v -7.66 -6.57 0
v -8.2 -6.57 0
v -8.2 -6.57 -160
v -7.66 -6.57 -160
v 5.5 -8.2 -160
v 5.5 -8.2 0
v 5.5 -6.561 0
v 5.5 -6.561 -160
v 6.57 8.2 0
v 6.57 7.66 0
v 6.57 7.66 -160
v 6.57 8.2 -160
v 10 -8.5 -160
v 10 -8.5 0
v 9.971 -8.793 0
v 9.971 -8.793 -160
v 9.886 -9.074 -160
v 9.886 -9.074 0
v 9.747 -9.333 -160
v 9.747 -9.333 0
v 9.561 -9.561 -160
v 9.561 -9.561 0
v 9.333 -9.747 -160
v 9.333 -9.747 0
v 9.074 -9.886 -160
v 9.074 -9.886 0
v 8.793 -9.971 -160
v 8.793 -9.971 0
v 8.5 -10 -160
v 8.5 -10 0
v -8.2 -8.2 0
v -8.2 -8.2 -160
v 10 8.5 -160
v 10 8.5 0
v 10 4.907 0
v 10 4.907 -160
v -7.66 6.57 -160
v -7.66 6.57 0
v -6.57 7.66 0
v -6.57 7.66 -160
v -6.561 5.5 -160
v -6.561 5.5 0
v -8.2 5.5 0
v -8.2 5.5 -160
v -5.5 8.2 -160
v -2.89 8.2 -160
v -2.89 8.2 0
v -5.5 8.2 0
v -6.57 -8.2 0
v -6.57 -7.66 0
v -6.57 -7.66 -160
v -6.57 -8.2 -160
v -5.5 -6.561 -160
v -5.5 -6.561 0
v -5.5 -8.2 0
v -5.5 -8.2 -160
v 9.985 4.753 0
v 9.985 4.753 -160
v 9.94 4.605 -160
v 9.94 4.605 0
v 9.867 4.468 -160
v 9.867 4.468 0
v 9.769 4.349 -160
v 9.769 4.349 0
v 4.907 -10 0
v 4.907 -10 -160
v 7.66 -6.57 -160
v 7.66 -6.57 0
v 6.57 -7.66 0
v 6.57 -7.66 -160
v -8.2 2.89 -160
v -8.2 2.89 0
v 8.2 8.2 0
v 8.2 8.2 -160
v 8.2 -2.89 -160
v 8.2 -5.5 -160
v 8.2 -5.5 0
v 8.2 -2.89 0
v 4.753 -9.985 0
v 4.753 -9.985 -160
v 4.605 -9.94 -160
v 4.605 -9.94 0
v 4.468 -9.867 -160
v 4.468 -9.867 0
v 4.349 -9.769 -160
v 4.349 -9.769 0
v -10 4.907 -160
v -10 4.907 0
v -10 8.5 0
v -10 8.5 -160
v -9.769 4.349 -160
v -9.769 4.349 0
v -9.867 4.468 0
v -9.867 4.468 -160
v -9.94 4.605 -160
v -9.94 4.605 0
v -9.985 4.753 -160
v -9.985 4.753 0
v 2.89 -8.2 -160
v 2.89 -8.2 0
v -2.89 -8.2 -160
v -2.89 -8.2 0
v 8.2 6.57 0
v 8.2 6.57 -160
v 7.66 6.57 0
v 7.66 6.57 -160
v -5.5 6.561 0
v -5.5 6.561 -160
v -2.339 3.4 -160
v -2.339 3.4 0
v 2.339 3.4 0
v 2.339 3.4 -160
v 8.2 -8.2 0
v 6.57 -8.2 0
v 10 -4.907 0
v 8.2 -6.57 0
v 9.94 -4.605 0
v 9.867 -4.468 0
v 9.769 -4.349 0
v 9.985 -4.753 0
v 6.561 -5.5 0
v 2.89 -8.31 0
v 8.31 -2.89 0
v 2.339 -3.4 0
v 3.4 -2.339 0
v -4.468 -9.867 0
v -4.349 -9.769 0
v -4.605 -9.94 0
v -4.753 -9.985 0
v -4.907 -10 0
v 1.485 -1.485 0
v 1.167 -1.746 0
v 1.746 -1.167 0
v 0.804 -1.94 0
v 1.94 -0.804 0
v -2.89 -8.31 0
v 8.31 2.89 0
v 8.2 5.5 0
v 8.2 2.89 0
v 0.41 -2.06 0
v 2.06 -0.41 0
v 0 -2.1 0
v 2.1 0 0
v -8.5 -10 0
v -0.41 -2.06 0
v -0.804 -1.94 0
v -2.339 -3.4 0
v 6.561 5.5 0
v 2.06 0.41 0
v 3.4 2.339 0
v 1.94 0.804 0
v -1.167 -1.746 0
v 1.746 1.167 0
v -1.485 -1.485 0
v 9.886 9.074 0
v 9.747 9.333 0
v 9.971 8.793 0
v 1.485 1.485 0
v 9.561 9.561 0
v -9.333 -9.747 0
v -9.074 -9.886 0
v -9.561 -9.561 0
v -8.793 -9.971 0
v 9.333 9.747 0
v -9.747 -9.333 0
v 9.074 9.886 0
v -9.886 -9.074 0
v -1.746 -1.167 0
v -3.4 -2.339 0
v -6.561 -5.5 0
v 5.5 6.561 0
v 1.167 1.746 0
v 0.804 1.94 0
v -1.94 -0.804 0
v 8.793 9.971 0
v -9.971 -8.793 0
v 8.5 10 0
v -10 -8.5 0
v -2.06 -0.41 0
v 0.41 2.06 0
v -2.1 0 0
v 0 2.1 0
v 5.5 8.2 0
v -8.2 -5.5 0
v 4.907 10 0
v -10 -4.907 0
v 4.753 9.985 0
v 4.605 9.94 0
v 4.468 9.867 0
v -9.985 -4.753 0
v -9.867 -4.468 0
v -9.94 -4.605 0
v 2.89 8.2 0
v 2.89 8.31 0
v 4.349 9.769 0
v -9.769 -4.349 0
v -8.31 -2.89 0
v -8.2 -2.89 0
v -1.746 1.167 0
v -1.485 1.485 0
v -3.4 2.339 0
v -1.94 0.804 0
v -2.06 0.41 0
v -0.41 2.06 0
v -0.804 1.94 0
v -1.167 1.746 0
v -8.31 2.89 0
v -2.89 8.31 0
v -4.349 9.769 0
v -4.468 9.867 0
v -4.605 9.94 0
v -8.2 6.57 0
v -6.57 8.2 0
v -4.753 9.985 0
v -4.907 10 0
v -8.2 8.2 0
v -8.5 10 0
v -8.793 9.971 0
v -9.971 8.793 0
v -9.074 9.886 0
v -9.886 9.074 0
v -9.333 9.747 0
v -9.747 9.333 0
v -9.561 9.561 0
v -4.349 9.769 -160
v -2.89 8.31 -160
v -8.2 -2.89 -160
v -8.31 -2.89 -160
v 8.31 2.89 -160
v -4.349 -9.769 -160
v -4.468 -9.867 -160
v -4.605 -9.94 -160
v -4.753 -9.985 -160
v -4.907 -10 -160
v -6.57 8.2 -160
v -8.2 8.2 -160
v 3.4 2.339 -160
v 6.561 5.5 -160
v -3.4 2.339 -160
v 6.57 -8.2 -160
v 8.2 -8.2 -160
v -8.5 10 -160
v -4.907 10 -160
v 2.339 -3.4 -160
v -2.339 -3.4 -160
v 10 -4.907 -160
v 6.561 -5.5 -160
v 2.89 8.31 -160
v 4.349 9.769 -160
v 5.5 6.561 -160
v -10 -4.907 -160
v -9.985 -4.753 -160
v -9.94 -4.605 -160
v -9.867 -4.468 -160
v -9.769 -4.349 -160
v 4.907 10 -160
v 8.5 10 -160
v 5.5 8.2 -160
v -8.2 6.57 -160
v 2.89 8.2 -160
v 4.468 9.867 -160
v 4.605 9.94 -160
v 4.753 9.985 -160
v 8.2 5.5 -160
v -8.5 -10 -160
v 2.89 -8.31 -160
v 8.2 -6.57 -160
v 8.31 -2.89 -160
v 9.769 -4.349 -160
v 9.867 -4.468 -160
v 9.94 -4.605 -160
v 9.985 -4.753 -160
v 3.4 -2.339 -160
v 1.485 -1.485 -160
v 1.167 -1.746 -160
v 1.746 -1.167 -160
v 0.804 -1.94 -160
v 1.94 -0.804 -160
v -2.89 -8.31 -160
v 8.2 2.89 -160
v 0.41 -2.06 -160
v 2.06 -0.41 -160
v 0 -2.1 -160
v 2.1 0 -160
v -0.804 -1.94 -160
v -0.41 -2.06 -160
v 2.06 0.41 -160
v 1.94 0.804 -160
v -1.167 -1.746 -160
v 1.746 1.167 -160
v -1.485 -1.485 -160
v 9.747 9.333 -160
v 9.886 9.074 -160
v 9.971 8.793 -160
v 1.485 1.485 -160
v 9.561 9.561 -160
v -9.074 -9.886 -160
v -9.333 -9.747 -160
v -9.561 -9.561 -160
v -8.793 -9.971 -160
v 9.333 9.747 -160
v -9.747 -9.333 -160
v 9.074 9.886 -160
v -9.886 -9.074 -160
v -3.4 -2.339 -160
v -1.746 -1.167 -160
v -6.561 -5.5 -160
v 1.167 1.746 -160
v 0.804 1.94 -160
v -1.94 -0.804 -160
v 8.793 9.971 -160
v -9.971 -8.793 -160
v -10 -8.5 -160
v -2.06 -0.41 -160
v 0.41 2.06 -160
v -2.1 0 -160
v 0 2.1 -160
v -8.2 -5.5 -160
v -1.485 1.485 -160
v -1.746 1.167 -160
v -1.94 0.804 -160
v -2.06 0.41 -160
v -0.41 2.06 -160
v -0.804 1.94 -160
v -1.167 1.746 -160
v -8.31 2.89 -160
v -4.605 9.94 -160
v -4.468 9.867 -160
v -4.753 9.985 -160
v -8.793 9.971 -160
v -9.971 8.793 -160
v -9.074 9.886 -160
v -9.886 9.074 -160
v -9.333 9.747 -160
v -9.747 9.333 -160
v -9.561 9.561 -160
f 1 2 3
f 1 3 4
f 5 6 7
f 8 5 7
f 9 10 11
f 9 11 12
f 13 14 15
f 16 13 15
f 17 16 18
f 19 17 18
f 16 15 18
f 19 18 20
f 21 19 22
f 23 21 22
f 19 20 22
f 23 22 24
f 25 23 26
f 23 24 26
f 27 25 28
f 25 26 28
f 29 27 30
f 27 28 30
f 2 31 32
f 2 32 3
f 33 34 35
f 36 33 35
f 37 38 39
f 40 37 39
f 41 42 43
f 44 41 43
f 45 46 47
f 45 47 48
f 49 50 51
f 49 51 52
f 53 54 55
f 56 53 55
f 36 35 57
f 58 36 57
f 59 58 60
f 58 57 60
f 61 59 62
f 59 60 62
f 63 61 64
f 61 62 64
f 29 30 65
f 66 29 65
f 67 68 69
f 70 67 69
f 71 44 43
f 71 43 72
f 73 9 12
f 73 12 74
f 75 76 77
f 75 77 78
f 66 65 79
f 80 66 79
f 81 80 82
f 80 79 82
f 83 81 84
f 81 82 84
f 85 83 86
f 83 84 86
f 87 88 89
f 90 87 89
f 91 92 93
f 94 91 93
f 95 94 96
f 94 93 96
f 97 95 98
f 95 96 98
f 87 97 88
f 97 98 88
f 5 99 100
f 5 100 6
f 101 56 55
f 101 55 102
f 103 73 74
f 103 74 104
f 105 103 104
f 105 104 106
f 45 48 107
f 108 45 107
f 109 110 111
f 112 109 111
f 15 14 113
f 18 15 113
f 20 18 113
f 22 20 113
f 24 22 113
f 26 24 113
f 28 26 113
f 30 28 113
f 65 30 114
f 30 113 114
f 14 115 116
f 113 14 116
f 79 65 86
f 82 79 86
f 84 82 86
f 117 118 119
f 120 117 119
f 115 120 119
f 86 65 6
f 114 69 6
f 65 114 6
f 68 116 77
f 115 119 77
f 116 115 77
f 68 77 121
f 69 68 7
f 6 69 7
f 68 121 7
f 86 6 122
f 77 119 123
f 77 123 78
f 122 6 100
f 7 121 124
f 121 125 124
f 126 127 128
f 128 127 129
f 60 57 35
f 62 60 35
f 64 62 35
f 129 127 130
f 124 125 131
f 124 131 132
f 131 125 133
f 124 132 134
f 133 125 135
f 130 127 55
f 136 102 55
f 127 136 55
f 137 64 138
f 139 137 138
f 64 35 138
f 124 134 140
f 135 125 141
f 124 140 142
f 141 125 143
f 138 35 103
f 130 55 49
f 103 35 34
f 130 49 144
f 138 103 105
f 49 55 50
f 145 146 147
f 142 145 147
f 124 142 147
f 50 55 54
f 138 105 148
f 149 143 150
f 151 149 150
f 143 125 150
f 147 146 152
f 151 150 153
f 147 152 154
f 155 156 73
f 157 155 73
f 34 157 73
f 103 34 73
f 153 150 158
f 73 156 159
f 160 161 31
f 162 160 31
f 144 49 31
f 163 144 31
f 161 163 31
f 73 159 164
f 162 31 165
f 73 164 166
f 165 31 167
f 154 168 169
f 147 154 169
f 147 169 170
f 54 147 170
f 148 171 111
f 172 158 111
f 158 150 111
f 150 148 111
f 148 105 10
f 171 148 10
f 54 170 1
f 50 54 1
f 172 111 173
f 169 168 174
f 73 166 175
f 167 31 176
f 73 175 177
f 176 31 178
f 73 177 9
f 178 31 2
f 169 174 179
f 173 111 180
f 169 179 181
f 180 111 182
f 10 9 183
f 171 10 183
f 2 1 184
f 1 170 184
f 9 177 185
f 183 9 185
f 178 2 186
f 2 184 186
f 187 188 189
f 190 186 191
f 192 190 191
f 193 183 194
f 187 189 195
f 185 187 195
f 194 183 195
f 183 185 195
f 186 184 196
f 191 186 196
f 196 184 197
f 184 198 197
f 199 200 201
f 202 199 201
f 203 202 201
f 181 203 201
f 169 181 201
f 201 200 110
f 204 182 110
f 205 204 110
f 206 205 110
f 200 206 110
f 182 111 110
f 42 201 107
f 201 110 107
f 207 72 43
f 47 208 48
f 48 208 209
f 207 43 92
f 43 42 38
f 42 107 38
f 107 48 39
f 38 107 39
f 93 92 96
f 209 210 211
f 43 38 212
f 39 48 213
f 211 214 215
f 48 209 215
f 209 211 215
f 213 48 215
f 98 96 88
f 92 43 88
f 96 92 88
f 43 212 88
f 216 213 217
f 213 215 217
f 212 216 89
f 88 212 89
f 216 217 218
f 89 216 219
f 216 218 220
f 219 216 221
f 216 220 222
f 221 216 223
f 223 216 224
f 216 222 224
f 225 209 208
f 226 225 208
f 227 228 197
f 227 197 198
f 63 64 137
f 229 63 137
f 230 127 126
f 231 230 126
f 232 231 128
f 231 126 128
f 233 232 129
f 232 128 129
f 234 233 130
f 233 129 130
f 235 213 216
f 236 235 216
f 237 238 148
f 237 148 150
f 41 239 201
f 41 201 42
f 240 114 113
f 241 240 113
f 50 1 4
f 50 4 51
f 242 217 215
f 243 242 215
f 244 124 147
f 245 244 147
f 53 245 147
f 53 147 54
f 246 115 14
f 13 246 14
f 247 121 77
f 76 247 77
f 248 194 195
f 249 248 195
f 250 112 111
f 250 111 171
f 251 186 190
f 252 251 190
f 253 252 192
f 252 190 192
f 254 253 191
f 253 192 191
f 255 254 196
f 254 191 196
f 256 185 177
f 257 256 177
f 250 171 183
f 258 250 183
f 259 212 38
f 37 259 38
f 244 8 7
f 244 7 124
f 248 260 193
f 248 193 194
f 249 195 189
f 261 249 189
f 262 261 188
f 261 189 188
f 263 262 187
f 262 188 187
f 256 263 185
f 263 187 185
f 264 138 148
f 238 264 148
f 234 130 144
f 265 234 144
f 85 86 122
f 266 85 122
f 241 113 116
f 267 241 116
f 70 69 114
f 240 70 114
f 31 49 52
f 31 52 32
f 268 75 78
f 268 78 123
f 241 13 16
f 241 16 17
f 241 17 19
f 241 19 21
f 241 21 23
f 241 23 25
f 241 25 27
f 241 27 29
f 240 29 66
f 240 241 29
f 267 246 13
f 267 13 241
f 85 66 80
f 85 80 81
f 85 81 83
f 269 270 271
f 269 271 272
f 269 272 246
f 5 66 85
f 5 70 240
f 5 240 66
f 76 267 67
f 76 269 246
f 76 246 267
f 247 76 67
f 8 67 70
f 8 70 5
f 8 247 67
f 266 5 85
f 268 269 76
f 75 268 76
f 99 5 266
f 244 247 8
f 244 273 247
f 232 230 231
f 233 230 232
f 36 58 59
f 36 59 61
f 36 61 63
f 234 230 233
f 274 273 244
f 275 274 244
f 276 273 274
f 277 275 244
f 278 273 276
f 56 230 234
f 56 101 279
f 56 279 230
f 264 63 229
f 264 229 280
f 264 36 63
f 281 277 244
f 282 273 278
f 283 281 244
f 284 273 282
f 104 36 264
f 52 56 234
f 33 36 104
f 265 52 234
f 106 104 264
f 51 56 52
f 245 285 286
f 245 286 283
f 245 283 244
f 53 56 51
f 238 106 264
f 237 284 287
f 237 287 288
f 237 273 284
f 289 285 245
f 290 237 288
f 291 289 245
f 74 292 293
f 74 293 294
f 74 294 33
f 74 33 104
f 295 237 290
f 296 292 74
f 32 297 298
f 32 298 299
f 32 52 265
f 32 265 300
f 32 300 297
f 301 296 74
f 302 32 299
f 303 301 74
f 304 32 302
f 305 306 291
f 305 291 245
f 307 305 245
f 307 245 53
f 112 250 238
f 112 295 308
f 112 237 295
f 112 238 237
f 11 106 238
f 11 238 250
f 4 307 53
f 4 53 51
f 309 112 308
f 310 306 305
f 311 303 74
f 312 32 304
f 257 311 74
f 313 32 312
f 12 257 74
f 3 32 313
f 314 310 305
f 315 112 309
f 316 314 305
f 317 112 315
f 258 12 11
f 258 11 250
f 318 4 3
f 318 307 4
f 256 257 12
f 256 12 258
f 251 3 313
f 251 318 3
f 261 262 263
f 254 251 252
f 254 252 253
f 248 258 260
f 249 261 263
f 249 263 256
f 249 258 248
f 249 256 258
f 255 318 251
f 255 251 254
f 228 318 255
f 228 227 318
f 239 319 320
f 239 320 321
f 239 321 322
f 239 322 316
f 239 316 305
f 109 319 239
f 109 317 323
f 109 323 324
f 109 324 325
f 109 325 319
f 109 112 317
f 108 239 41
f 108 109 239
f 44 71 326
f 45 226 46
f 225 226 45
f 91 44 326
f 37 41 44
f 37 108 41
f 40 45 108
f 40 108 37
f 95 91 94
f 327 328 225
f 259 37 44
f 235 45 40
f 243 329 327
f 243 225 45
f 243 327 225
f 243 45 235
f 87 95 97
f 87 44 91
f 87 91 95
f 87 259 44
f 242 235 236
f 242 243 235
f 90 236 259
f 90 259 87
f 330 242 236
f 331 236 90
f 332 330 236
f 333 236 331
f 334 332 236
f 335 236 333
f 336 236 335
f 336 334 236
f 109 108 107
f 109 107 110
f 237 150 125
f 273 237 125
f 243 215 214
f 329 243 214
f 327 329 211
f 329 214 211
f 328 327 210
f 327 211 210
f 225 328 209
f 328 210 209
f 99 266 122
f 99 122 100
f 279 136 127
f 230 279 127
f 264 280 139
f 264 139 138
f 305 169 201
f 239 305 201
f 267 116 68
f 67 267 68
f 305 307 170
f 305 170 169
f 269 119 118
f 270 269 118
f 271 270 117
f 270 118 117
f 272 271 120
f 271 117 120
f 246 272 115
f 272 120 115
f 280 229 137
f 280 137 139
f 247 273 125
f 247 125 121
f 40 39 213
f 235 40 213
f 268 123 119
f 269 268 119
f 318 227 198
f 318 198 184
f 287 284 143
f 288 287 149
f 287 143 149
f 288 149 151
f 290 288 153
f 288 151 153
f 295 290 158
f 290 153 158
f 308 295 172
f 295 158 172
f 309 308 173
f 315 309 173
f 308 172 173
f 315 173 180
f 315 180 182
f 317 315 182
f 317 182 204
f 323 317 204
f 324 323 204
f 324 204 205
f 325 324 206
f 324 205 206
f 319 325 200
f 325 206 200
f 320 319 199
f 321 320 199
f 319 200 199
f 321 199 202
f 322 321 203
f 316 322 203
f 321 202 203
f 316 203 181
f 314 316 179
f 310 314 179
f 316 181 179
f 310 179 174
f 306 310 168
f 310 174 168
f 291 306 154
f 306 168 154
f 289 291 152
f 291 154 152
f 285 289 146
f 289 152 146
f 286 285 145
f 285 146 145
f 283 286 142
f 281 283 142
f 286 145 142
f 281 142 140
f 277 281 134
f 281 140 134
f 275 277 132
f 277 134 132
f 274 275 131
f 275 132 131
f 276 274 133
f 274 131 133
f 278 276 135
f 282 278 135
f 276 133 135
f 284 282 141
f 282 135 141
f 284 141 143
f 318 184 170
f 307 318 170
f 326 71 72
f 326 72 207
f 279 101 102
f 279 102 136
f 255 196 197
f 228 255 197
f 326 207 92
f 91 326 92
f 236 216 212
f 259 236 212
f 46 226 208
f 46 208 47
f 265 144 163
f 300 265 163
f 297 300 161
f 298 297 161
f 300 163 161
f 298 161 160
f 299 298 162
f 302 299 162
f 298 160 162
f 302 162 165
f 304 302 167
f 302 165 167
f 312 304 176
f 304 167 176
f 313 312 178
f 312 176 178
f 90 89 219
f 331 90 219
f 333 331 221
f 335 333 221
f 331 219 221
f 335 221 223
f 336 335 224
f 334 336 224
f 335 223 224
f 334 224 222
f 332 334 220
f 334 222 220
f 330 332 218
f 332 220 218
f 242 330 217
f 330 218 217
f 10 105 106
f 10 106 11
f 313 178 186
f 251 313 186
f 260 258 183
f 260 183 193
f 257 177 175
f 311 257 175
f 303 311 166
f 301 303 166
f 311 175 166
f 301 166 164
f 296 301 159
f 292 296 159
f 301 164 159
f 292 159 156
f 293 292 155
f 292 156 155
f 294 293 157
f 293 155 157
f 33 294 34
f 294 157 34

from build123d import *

# Parameters (mm, degrees)
SKETCH6_R           = 2.1
BOSS_EXTRUDE1_DEPTH = 160


with BuildPart() as part:
    # Sketch6 → Boss-Extrude1 (new body)
    with BuildSketch(Plane.XY):
        with BuildLine():
            Line((-3.4, -2.339339828), (-3.4, 2.339339828))
            Line((-3.4, 2.339339828), (-6.560660172, 5.5))
            Line((-6.560660172, 5.5), (-8.2, 5.5))
            Line((-8.2, 5.5), (-8.2, 2.89))
            Line((-8.2, 2.89), (-8.31, 2.89))
            Line((-8.31, 2.89), (-9.768614357, 4.348614357))
            ThreePointArc((-9.768614357, 4.348614357), (-9.939864831, 4.604908803), (-10, 4.907228714))
            Line((-10, 4.907228714), (-10, 8.5))
            ThreePointArc((-10, 8.5), (-9.560660172, 9.560660172), (-8.5, 10))
            Line((-8.5, 10), (-4.907228714, 10))
            ThreePointArc((-4.907228714, 10), (-4.604908803, 9.939864831), (-4.348614357, 9.768614357))
            Line((-4.348614357, 9.768614357), (-2.89, 8.31))
            Line((-2.89, 8.31), (-2.89, 8.2))
            Line((-2.89, 8.2), (-5.5, 8.2))
            Line((-5.5, 8.2), (-5.5, 6.560660172))
            Line((-5.5, 6.560660172), (-2.339339828, 3.4))
            Line((-2.339339828, 3.4), (2.339339828, 3.4))
            Line((2.339339828, 3.4), (5.5, 6.560660172))
            Line((5.5, 6.560660172), (5.5, 8.2))
            Line((5.5, 8.2), (2.89, 8.2))
            Line((2.89, 8.2), (2.89, 8.31))
            Line((2.89, 8.31), (4.348614357, 9.768614357))
            ThreePointArc((4.348614357, 9.768614357), (4.604908803, 9.939864831), (4.907228714, 10))
            Line((4.907228714, 10), (8.5, 10))
            ThreePointArc((8.5, 10), (9.560660172, 9.560660172), (10, 8.5))
            Line((10, 8.5), (10, 4.907228714))
            ThreePointArc((10, 4.907228714), (9.939864831, 4.604908803), (9.768614357, 4.348614357))
            Line((9.768614357, 4.348614357), (8.31, 2.89))
            Line((8.31, 2.89), (8.2, 2.89))
            Line((8.2, 2.89), (8.2, 5.5))
            Line((8.2, 5.5), (6.560660172, 5.5))
            Line((6.560660172, 5.5), (3.4, 2.339339828))
            Line((3.4, 2.339339828), (3.4, -2.339339828))
            Line((3.4, -2.339339828), (6.560660172, -5.5))
            Line((6.560660172, -5.5), (8.2, -5.5))
            Line((8.2, -5.5), (8.2, -2.89))
            Line((8.2, -2.89), (8.31, -2.89))
            Line((8.31, -2.89), (9.768614357, -4.348614357))
            ThreePointArc((9.768614357, -4.348614357), (9.939864831, -4.604908803), (10, -4.907228714))
            Line((10, -4.907228714), (10, -8.5))
            ThreePointArc((10, -8.5), (9.560660172, -9.560660172), (8.5, -10))
            Line((8.5, -10), (4.907228714, -10))
            ThreePointArc((4.907228714, -10), (4.604908803, -9.939864831), (4.348614357, -9.768614357))
            Line((4.348614357, -9.768614357), (2.89, -8.31))
            Line((2.89, -8.31), (2.89, -8.2))
            Line((2.89, -8.2), (5.5, -8.2))
            Line((5.5, -8.2), (5.5, -6.560660172))
            Line((5.5, -6.560660172), (2.339339828, -3.4))
            Line((2.339339828, -3.4), (-2.339339828, -3.4))
            Line((-2.339339828, -3.4), (-5.5, -6.560660172))
            Line((-5.5, -6.560660172), (-5.5, -8.2))
            Line((-5.5, -8.2), (-2.89, -8.2))
            Line((-2.89, -8.2), (-2.89, -8.31))
            Line((-2.89, -8.31), (-4.348614357, -9.768614357))
            ThreePointArc((-4.348614357, -9.768614357), (-4.604908803, -9.939864831), (-4.907228714, -10))
            Line((-4.907228714, -10), (-8.5, -10))
            ThreePointArc((-8.5, -10), (-9.560660172, -9.560660172), (-10, -8.5))
            Line((-10, -8.5), (-10, -4.907228714))
            ThreePointArc((-10, -4.907228714), (-9.939864831, -4.604908803), (-9.768614357, -4.348614357))
            Line((-9.768614357, -4.348614357), (-8.31, -2.89))
            Line((-8.31, -2.89), (-8.2, -2.89))
            Line((-8.2, -2.89), (-8.2, -5.5))
            Line((-8.2, -5.5), (-6.560660172, -5.5))
            Line((-6.560660172, -5.5), (-3.4, -2.339339828))
        make_face()
        Circle(SKETCH6_R, mode=Mode.SUBTRACT)
        Polygon((-7.66, 6.57), (-6.57, 7.66), (-6.57, 8.2), (-8.2, 8.2), (-8.2, 6.57), align=None, mode=Mode.SUBTRACT)
        Polygon((8.2, 6.57), (7.66, 6.57), (6.57, 7.66), (6.57, 8.2), (8.2, 8.2), align=None, mode=Mode.SUBTRACT)
        Polygon((7.66, -6.57), (6.57, -7.66), (6.57, -8.2), (8.2, -8.2), (8.2, -6.57), align=None, mode=Mode.SUBTRACT)
        Polygon((-8.2, -6.57), (-7.66, -6.57), (-6.57, -7.66), (-6.57, -8.2), (-8.2, -8.2), align=None, mode=Mode.SUBTRACT)
    extrude(amount=-BOSS_EXTRUDE1_DEPTH)


solid = part.part
